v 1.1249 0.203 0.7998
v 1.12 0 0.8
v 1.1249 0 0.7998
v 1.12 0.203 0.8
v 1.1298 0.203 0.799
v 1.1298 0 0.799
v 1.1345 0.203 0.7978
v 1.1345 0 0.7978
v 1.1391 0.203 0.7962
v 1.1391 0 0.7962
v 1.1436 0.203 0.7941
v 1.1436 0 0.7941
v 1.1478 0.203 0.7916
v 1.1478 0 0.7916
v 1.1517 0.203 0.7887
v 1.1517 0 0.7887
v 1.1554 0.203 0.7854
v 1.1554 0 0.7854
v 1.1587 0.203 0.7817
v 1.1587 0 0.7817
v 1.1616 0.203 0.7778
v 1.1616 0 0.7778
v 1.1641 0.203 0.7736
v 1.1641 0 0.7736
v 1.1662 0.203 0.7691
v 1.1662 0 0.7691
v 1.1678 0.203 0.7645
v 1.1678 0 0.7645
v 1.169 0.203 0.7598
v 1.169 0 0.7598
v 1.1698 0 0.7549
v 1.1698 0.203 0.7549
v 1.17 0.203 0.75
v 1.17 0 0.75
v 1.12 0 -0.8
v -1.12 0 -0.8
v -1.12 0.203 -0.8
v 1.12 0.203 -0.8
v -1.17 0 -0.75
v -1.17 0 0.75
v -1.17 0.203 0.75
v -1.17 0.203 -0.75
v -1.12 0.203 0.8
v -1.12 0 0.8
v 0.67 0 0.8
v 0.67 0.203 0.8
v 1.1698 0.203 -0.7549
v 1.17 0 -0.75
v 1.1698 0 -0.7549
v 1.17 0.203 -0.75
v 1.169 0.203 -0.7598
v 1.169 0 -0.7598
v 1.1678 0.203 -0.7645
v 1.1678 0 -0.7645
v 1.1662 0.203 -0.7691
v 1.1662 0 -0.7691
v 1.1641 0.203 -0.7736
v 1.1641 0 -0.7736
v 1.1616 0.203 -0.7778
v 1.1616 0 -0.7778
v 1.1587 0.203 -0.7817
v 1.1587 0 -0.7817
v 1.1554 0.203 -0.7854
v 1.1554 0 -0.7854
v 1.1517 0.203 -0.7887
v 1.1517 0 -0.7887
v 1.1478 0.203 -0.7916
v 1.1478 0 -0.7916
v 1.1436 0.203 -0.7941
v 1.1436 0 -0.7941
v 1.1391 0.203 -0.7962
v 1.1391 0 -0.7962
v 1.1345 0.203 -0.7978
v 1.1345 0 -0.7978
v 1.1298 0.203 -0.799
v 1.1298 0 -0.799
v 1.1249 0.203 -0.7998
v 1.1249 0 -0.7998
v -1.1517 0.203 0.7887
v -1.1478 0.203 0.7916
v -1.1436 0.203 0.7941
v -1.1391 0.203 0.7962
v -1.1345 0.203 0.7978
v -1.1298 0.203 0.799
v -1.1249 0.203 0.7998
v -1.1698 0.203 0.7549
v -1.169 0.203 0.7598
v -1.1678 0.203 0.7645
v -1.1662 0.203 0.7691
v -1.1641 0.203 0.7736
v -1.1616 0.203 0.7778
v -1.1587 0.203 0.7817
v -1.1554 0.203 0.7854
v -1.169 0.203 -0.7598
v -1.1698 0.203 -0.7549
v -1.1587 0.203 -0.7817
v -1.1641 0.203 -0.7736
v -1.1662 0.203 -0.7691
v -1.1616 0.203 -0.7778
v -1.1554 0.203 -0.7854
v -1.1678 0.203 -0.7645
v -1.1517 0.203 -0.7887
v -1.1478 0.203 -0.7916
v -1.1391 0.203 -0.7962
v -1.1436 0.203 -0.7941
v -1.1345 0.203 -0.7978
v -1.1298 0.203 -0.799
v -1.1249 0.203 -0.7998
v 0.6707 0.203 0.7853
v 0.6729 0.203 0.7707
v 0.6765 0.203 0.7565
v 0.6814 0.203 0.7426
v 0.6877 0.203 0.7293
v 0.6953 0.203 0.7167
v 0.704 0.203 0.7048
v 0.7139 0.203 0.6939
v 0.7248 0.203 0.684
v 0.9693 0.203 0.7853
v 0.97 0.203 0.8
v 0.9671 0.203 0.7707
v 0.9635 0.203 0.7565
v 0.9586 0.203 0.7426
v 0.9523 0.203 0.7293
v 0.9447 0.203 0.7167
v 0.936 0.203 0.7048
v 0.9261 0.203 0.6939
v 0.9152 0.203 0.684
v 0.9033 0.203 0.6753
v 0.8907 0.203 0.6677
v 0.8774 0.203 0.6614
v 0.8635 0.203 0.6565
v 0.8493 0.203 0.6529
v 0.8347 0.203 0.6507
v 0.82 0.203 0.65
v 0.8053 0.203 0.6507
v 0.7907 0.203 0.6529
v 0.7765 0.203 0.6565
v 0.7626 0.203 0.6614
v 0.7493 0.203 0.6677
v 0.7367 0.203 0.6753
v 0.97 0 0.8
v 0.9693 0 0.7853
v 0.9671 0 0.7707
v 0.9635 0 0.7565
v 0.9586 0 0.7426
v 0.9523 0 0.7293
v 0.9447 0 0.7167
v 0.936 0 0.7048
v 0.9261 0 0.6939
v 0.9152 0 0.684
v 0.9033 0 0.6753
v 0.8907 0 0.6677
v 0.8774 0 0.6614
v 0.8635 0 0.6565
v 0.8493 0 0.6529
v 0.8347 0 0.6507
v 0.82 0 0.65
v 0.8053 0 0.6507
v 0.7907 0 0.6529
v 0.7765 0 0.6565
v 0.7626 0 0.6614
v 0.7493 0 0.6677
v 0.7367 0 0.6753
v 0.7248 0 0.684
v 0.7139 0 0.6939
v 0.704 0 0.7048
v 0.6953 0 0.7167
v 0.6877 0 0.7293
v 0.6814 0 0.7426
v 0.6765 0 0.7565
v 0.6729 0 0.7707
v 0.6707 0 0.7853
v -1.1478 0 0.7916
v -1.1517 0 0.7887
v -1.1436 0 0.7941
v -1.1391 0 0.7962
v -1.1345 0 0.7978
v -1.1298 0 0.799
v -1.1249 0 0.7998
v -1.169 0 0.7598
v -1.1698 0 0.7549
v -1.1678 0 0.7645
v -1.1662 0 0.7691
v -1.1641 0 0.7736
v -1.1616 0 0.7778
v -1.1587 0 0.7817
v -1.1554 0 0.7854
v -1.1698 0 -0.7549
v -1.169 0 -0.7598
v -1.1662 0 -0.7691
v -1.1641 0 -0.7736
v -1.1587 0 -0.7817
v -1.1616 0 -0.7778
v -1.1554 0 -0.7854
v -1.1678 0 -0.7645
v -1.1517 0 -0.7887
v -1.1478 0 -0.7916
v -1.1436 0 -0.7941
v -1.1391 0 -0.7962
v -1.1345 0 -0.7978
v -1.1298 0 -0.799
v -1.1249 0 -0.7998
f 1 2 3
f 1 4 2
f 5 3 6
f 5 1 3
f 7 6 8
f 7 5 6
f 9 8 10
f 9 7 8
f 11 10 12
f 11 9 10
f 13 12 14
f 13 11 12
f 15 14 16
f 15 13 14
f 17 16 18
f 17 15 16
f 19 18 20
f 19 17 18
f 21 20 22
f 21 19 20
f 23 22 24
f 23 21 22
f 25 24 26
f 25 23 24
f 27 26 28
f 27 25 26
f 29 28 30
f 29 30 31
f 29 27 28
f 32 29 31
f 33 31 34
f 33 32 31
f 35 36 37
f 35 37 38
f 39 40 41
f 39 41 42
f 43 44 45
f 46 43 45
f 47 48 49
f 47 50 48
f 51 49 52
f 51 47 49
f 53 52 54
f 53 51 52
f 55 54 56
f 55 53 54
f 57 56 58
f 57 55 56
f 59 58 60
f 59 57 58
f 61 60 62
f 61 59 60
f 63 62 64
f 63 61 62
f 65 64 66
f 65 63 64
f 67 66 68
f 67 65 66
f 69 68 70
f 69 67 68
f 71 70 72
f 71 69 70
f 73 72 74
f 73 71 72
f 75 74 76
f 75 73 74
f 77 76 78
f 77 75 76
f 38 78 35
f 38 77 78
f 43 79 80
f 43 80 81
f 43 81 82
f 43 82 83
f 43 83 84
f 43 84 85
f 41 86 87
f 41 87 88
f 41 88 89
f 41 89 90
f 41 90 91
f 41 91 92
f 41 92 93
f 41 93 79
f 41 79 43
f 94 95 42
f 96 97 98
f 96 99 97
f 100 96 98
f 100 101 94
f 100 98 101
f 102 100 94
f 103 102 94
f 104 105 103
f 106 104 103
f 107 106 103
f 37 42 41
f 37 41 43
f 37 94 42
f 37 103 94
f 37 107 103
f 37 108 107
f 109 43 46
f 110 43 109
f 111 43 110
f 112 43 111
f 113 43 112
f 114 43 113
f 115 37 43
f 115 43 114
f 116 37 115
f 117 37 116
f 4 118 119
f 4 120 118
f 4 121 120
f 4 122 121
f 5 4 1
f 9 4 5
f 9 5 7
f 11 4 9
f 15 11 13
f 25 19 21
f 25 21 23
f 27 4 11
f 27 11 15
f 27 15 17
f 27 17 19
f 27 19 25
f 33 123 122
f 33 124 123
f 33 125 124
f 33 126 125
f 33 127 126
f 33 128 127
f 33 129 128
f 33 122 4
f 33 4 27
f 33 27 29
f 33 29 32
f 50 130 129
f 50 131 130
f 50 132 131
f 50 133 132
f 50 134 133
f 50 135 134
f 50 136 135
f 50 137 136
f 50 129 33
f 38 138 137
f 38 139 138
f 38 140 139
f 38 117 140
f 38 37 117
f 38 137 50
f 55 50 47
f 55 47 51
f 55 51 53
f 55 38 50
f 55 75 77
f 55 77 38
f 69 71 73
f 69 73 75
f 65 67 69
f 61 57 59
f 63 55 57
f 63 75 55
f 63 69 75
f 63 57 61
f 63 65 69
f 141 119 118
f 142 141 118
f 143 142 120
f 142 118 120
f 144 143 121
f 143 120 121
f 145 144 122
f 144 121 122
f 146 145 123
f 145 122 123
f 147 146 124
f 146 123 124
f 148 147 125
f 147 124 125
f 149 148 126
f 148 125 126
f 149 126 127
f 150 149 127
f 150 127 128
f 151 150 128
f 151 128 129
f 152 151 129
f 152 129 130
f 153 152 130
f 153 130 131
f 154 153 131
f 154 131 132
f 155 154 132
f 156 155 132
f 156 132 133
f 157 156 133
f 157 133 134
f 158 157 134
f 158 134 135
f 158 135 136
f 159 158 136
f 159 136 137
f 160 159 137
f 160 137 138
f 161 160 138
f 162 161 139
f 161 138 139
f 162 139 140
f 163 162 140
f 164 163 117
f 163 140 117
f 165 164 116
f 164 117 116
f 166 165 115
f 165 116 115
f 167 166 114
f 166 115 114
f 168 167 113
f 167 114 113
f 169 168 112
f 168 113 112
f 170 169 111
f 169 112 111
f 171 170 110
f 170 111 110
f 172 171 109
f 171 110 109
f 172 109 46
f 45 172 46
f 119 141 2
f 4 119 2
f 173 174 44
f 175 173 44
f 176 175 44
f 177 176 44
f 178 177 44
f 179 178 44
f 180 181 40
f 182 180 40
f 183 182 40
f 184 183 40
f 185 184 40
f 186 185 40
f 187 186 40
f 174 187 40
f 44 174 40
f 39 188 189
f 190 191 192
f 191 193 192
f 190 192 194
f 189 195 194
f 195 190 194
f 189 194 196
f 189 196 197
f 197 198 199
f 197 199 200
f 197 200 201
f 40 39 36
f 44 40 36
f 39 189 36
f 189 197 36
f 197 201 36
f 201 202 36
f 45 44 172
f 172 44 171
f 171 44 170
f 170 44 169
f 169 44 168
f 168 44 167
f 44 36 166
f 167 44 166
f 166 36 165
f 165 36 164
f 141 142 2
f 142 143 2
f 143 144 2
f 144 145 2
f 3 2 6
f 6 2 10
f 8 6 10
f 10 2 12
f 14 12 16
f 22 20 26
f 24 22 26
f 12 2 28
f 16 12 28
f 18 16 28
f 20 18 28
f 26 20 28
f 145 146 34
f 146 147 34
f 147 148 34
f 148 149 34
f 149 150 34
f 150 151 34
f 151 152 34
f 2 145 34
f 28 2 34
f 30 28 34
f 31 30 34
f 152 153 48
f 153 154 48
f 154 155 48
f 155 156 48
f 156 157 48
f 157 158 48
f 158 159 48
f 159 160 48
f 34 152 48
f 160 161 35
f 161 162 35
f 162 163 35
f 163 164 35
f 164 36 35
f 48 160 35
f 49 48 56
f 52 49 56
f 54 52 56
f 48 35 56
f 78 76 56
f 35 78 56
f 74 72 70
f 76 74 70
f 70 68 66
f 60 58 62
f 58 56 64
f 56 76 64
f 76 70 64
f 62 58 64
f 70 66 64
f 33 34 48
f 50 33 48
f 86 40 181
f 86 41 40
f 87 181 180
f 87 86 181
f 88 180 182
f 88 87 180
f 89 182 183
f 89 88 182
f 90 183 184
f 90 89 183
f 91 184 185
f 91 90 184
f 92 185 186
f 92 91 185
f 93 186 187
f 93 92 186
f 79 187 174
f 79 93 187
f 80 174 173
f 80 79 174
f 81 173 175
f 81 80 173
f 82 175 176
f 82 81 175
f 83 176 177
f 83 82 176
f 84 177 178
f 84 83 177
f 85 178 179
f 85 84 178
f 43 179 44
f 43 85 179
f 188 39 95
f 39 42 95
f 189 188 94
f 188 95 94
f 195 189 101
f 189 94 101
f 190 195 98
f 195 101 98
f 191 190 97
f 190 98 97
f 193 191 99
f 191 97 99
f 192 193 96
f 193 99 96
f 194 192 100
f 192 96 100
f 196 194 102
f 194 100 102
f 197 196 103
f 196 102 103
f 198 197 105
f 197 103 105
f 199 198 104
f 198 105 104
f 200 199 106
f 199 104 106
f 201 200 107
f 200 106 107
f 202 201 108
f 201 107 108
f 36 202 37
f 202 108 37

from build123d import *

# Parameters (mm, degrees)
SKETCH1_W           = 2.34
SKETCH1_H           = 1.6
BOSS_EXTRUDE1_DEPTH = 0.203
FILLET1_R           = 0.05
SKETCH2_R           = 0.15
CUT_EXTRUDE1_DEPTH  = 1.203


with BuildPart() as part:
    # Sketch1 → Boss-Extrude1 (new body)
    with BuildSketch(Plane(origin=(0, 0, 0), x_dir=(1, 0, 0), z_dir=(0, 1, 0))):
        Rectangle(SKETCH1_W, SKETCH1_H)
    extrude(amount=BOSS_EXTRUDE1_DEPTH)

    # Fillet1
    fillet1_edges = [part.edges().sort_by_distance(p)[0] for p in [
        (1.17, 0.1015, 0.8),
        (-1.17, 0.1015, 0.8),
        (-1.17, 0.1015, -0.8),
        (1.17, 0.1015, -0.8),
    ]]
    fillet(fillet1_edges, radius=FILLET1_R)

    # Sketch2 → Cut-Extrude1 (cut, through all)
    with BuildSketch(Plane(origin=(0, 0.203, 0), x_dir=(1, 0, 0), z_dir=(0, 1, 0))):
        with Locations((0.82, -0.8)):
            Circle(SKETCH2_R)
    extrude(amount=-CUT_EXTRUDE1_DEPTH, mode=Mode.SUBTRACT)


solid = part.part
